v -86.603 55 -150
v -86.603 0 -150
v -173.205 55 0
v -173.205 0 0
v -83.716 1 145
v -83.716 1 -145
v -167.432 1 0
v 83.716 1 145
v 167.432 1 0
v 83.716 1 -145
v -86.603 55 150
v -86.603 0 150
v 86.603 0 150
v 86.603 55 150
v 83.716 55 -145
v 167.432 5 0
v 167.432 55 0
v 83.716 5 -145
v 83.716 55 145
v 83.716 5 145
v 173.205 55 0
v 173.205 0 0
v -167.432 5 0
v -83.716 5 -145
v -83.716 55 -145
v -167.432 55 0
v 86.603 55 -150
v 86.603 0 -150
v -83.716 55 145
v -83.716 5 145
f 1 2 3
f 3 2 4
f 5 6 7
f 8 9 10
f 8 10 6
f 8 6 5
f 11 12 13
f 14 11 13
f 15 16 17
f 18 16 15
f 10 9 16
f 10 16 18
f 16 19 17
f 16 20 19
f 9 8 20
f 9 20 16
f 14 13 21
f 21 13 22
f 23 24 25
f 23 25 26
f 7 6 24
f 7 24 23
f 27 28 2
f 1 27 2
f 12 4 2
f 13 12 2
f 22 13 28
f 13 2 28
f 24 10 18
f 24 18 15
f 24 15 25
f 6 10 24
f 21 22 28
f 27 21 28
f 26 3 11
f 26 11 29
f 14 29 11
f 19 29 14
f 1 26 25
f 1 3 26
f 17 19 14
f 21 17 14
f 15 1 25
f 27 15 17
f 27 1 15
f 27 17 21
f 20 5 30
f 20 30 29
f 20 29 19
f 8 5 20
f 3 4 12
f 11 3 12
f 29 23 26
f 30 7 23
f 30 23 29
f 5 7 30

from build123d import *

# Parameters (mm, degrees)
BOSS_EXTRUDE1_DEPTH      = 55
SHELL1_T                 = -5
SHELL1_THICKNESS_2_DEPTH = 4


with BuildPart() as part:
    # Sketch1 → Boss-Extrude1 (new body)
    with BuildSketch(Plane(origin=(0, 0, 0), x_dir=(1, 0, 0), z_dir=(0, 1, 0))):
        Polygon((173.205080757, 0), (86.602540378, 150), (-86.602540378, 150), (-173.205080757, 0), (-86.602540378, -150), (86.602540378, -150), align=None)
    extrude(amount=BOSS_EXTRUDE1_DEPTH)

    # Shell1
    shell1_openings = [part.faces().sort_by_distance(p)[0] for p in [
        (0, 55, 0),
    ]]
    offset(amount=SHELL1_T, openings=shell1_openings, kind=Kind.INTERSECTION)

    # Shell1 thickness 2 face (on inner face of the shell) → Shell1 thickness 2 (cut)
    with BuildSketch(Plane(origin=(0, 5, 0), x_dir=(0, 0, -1), z_dir=(0, -1, 0))):
        Polygon((-145, 83.715789032), (0, 167.431578065), (145, 83.715789032), (145, -83.715789032), (0, -167.431578065), (-145, -83.715789032), align=None)
    extrude(amount=SHELL1_THICKNESS_2_DEPTH, mode=Mode.SUBTRACT)


solid = part.part
